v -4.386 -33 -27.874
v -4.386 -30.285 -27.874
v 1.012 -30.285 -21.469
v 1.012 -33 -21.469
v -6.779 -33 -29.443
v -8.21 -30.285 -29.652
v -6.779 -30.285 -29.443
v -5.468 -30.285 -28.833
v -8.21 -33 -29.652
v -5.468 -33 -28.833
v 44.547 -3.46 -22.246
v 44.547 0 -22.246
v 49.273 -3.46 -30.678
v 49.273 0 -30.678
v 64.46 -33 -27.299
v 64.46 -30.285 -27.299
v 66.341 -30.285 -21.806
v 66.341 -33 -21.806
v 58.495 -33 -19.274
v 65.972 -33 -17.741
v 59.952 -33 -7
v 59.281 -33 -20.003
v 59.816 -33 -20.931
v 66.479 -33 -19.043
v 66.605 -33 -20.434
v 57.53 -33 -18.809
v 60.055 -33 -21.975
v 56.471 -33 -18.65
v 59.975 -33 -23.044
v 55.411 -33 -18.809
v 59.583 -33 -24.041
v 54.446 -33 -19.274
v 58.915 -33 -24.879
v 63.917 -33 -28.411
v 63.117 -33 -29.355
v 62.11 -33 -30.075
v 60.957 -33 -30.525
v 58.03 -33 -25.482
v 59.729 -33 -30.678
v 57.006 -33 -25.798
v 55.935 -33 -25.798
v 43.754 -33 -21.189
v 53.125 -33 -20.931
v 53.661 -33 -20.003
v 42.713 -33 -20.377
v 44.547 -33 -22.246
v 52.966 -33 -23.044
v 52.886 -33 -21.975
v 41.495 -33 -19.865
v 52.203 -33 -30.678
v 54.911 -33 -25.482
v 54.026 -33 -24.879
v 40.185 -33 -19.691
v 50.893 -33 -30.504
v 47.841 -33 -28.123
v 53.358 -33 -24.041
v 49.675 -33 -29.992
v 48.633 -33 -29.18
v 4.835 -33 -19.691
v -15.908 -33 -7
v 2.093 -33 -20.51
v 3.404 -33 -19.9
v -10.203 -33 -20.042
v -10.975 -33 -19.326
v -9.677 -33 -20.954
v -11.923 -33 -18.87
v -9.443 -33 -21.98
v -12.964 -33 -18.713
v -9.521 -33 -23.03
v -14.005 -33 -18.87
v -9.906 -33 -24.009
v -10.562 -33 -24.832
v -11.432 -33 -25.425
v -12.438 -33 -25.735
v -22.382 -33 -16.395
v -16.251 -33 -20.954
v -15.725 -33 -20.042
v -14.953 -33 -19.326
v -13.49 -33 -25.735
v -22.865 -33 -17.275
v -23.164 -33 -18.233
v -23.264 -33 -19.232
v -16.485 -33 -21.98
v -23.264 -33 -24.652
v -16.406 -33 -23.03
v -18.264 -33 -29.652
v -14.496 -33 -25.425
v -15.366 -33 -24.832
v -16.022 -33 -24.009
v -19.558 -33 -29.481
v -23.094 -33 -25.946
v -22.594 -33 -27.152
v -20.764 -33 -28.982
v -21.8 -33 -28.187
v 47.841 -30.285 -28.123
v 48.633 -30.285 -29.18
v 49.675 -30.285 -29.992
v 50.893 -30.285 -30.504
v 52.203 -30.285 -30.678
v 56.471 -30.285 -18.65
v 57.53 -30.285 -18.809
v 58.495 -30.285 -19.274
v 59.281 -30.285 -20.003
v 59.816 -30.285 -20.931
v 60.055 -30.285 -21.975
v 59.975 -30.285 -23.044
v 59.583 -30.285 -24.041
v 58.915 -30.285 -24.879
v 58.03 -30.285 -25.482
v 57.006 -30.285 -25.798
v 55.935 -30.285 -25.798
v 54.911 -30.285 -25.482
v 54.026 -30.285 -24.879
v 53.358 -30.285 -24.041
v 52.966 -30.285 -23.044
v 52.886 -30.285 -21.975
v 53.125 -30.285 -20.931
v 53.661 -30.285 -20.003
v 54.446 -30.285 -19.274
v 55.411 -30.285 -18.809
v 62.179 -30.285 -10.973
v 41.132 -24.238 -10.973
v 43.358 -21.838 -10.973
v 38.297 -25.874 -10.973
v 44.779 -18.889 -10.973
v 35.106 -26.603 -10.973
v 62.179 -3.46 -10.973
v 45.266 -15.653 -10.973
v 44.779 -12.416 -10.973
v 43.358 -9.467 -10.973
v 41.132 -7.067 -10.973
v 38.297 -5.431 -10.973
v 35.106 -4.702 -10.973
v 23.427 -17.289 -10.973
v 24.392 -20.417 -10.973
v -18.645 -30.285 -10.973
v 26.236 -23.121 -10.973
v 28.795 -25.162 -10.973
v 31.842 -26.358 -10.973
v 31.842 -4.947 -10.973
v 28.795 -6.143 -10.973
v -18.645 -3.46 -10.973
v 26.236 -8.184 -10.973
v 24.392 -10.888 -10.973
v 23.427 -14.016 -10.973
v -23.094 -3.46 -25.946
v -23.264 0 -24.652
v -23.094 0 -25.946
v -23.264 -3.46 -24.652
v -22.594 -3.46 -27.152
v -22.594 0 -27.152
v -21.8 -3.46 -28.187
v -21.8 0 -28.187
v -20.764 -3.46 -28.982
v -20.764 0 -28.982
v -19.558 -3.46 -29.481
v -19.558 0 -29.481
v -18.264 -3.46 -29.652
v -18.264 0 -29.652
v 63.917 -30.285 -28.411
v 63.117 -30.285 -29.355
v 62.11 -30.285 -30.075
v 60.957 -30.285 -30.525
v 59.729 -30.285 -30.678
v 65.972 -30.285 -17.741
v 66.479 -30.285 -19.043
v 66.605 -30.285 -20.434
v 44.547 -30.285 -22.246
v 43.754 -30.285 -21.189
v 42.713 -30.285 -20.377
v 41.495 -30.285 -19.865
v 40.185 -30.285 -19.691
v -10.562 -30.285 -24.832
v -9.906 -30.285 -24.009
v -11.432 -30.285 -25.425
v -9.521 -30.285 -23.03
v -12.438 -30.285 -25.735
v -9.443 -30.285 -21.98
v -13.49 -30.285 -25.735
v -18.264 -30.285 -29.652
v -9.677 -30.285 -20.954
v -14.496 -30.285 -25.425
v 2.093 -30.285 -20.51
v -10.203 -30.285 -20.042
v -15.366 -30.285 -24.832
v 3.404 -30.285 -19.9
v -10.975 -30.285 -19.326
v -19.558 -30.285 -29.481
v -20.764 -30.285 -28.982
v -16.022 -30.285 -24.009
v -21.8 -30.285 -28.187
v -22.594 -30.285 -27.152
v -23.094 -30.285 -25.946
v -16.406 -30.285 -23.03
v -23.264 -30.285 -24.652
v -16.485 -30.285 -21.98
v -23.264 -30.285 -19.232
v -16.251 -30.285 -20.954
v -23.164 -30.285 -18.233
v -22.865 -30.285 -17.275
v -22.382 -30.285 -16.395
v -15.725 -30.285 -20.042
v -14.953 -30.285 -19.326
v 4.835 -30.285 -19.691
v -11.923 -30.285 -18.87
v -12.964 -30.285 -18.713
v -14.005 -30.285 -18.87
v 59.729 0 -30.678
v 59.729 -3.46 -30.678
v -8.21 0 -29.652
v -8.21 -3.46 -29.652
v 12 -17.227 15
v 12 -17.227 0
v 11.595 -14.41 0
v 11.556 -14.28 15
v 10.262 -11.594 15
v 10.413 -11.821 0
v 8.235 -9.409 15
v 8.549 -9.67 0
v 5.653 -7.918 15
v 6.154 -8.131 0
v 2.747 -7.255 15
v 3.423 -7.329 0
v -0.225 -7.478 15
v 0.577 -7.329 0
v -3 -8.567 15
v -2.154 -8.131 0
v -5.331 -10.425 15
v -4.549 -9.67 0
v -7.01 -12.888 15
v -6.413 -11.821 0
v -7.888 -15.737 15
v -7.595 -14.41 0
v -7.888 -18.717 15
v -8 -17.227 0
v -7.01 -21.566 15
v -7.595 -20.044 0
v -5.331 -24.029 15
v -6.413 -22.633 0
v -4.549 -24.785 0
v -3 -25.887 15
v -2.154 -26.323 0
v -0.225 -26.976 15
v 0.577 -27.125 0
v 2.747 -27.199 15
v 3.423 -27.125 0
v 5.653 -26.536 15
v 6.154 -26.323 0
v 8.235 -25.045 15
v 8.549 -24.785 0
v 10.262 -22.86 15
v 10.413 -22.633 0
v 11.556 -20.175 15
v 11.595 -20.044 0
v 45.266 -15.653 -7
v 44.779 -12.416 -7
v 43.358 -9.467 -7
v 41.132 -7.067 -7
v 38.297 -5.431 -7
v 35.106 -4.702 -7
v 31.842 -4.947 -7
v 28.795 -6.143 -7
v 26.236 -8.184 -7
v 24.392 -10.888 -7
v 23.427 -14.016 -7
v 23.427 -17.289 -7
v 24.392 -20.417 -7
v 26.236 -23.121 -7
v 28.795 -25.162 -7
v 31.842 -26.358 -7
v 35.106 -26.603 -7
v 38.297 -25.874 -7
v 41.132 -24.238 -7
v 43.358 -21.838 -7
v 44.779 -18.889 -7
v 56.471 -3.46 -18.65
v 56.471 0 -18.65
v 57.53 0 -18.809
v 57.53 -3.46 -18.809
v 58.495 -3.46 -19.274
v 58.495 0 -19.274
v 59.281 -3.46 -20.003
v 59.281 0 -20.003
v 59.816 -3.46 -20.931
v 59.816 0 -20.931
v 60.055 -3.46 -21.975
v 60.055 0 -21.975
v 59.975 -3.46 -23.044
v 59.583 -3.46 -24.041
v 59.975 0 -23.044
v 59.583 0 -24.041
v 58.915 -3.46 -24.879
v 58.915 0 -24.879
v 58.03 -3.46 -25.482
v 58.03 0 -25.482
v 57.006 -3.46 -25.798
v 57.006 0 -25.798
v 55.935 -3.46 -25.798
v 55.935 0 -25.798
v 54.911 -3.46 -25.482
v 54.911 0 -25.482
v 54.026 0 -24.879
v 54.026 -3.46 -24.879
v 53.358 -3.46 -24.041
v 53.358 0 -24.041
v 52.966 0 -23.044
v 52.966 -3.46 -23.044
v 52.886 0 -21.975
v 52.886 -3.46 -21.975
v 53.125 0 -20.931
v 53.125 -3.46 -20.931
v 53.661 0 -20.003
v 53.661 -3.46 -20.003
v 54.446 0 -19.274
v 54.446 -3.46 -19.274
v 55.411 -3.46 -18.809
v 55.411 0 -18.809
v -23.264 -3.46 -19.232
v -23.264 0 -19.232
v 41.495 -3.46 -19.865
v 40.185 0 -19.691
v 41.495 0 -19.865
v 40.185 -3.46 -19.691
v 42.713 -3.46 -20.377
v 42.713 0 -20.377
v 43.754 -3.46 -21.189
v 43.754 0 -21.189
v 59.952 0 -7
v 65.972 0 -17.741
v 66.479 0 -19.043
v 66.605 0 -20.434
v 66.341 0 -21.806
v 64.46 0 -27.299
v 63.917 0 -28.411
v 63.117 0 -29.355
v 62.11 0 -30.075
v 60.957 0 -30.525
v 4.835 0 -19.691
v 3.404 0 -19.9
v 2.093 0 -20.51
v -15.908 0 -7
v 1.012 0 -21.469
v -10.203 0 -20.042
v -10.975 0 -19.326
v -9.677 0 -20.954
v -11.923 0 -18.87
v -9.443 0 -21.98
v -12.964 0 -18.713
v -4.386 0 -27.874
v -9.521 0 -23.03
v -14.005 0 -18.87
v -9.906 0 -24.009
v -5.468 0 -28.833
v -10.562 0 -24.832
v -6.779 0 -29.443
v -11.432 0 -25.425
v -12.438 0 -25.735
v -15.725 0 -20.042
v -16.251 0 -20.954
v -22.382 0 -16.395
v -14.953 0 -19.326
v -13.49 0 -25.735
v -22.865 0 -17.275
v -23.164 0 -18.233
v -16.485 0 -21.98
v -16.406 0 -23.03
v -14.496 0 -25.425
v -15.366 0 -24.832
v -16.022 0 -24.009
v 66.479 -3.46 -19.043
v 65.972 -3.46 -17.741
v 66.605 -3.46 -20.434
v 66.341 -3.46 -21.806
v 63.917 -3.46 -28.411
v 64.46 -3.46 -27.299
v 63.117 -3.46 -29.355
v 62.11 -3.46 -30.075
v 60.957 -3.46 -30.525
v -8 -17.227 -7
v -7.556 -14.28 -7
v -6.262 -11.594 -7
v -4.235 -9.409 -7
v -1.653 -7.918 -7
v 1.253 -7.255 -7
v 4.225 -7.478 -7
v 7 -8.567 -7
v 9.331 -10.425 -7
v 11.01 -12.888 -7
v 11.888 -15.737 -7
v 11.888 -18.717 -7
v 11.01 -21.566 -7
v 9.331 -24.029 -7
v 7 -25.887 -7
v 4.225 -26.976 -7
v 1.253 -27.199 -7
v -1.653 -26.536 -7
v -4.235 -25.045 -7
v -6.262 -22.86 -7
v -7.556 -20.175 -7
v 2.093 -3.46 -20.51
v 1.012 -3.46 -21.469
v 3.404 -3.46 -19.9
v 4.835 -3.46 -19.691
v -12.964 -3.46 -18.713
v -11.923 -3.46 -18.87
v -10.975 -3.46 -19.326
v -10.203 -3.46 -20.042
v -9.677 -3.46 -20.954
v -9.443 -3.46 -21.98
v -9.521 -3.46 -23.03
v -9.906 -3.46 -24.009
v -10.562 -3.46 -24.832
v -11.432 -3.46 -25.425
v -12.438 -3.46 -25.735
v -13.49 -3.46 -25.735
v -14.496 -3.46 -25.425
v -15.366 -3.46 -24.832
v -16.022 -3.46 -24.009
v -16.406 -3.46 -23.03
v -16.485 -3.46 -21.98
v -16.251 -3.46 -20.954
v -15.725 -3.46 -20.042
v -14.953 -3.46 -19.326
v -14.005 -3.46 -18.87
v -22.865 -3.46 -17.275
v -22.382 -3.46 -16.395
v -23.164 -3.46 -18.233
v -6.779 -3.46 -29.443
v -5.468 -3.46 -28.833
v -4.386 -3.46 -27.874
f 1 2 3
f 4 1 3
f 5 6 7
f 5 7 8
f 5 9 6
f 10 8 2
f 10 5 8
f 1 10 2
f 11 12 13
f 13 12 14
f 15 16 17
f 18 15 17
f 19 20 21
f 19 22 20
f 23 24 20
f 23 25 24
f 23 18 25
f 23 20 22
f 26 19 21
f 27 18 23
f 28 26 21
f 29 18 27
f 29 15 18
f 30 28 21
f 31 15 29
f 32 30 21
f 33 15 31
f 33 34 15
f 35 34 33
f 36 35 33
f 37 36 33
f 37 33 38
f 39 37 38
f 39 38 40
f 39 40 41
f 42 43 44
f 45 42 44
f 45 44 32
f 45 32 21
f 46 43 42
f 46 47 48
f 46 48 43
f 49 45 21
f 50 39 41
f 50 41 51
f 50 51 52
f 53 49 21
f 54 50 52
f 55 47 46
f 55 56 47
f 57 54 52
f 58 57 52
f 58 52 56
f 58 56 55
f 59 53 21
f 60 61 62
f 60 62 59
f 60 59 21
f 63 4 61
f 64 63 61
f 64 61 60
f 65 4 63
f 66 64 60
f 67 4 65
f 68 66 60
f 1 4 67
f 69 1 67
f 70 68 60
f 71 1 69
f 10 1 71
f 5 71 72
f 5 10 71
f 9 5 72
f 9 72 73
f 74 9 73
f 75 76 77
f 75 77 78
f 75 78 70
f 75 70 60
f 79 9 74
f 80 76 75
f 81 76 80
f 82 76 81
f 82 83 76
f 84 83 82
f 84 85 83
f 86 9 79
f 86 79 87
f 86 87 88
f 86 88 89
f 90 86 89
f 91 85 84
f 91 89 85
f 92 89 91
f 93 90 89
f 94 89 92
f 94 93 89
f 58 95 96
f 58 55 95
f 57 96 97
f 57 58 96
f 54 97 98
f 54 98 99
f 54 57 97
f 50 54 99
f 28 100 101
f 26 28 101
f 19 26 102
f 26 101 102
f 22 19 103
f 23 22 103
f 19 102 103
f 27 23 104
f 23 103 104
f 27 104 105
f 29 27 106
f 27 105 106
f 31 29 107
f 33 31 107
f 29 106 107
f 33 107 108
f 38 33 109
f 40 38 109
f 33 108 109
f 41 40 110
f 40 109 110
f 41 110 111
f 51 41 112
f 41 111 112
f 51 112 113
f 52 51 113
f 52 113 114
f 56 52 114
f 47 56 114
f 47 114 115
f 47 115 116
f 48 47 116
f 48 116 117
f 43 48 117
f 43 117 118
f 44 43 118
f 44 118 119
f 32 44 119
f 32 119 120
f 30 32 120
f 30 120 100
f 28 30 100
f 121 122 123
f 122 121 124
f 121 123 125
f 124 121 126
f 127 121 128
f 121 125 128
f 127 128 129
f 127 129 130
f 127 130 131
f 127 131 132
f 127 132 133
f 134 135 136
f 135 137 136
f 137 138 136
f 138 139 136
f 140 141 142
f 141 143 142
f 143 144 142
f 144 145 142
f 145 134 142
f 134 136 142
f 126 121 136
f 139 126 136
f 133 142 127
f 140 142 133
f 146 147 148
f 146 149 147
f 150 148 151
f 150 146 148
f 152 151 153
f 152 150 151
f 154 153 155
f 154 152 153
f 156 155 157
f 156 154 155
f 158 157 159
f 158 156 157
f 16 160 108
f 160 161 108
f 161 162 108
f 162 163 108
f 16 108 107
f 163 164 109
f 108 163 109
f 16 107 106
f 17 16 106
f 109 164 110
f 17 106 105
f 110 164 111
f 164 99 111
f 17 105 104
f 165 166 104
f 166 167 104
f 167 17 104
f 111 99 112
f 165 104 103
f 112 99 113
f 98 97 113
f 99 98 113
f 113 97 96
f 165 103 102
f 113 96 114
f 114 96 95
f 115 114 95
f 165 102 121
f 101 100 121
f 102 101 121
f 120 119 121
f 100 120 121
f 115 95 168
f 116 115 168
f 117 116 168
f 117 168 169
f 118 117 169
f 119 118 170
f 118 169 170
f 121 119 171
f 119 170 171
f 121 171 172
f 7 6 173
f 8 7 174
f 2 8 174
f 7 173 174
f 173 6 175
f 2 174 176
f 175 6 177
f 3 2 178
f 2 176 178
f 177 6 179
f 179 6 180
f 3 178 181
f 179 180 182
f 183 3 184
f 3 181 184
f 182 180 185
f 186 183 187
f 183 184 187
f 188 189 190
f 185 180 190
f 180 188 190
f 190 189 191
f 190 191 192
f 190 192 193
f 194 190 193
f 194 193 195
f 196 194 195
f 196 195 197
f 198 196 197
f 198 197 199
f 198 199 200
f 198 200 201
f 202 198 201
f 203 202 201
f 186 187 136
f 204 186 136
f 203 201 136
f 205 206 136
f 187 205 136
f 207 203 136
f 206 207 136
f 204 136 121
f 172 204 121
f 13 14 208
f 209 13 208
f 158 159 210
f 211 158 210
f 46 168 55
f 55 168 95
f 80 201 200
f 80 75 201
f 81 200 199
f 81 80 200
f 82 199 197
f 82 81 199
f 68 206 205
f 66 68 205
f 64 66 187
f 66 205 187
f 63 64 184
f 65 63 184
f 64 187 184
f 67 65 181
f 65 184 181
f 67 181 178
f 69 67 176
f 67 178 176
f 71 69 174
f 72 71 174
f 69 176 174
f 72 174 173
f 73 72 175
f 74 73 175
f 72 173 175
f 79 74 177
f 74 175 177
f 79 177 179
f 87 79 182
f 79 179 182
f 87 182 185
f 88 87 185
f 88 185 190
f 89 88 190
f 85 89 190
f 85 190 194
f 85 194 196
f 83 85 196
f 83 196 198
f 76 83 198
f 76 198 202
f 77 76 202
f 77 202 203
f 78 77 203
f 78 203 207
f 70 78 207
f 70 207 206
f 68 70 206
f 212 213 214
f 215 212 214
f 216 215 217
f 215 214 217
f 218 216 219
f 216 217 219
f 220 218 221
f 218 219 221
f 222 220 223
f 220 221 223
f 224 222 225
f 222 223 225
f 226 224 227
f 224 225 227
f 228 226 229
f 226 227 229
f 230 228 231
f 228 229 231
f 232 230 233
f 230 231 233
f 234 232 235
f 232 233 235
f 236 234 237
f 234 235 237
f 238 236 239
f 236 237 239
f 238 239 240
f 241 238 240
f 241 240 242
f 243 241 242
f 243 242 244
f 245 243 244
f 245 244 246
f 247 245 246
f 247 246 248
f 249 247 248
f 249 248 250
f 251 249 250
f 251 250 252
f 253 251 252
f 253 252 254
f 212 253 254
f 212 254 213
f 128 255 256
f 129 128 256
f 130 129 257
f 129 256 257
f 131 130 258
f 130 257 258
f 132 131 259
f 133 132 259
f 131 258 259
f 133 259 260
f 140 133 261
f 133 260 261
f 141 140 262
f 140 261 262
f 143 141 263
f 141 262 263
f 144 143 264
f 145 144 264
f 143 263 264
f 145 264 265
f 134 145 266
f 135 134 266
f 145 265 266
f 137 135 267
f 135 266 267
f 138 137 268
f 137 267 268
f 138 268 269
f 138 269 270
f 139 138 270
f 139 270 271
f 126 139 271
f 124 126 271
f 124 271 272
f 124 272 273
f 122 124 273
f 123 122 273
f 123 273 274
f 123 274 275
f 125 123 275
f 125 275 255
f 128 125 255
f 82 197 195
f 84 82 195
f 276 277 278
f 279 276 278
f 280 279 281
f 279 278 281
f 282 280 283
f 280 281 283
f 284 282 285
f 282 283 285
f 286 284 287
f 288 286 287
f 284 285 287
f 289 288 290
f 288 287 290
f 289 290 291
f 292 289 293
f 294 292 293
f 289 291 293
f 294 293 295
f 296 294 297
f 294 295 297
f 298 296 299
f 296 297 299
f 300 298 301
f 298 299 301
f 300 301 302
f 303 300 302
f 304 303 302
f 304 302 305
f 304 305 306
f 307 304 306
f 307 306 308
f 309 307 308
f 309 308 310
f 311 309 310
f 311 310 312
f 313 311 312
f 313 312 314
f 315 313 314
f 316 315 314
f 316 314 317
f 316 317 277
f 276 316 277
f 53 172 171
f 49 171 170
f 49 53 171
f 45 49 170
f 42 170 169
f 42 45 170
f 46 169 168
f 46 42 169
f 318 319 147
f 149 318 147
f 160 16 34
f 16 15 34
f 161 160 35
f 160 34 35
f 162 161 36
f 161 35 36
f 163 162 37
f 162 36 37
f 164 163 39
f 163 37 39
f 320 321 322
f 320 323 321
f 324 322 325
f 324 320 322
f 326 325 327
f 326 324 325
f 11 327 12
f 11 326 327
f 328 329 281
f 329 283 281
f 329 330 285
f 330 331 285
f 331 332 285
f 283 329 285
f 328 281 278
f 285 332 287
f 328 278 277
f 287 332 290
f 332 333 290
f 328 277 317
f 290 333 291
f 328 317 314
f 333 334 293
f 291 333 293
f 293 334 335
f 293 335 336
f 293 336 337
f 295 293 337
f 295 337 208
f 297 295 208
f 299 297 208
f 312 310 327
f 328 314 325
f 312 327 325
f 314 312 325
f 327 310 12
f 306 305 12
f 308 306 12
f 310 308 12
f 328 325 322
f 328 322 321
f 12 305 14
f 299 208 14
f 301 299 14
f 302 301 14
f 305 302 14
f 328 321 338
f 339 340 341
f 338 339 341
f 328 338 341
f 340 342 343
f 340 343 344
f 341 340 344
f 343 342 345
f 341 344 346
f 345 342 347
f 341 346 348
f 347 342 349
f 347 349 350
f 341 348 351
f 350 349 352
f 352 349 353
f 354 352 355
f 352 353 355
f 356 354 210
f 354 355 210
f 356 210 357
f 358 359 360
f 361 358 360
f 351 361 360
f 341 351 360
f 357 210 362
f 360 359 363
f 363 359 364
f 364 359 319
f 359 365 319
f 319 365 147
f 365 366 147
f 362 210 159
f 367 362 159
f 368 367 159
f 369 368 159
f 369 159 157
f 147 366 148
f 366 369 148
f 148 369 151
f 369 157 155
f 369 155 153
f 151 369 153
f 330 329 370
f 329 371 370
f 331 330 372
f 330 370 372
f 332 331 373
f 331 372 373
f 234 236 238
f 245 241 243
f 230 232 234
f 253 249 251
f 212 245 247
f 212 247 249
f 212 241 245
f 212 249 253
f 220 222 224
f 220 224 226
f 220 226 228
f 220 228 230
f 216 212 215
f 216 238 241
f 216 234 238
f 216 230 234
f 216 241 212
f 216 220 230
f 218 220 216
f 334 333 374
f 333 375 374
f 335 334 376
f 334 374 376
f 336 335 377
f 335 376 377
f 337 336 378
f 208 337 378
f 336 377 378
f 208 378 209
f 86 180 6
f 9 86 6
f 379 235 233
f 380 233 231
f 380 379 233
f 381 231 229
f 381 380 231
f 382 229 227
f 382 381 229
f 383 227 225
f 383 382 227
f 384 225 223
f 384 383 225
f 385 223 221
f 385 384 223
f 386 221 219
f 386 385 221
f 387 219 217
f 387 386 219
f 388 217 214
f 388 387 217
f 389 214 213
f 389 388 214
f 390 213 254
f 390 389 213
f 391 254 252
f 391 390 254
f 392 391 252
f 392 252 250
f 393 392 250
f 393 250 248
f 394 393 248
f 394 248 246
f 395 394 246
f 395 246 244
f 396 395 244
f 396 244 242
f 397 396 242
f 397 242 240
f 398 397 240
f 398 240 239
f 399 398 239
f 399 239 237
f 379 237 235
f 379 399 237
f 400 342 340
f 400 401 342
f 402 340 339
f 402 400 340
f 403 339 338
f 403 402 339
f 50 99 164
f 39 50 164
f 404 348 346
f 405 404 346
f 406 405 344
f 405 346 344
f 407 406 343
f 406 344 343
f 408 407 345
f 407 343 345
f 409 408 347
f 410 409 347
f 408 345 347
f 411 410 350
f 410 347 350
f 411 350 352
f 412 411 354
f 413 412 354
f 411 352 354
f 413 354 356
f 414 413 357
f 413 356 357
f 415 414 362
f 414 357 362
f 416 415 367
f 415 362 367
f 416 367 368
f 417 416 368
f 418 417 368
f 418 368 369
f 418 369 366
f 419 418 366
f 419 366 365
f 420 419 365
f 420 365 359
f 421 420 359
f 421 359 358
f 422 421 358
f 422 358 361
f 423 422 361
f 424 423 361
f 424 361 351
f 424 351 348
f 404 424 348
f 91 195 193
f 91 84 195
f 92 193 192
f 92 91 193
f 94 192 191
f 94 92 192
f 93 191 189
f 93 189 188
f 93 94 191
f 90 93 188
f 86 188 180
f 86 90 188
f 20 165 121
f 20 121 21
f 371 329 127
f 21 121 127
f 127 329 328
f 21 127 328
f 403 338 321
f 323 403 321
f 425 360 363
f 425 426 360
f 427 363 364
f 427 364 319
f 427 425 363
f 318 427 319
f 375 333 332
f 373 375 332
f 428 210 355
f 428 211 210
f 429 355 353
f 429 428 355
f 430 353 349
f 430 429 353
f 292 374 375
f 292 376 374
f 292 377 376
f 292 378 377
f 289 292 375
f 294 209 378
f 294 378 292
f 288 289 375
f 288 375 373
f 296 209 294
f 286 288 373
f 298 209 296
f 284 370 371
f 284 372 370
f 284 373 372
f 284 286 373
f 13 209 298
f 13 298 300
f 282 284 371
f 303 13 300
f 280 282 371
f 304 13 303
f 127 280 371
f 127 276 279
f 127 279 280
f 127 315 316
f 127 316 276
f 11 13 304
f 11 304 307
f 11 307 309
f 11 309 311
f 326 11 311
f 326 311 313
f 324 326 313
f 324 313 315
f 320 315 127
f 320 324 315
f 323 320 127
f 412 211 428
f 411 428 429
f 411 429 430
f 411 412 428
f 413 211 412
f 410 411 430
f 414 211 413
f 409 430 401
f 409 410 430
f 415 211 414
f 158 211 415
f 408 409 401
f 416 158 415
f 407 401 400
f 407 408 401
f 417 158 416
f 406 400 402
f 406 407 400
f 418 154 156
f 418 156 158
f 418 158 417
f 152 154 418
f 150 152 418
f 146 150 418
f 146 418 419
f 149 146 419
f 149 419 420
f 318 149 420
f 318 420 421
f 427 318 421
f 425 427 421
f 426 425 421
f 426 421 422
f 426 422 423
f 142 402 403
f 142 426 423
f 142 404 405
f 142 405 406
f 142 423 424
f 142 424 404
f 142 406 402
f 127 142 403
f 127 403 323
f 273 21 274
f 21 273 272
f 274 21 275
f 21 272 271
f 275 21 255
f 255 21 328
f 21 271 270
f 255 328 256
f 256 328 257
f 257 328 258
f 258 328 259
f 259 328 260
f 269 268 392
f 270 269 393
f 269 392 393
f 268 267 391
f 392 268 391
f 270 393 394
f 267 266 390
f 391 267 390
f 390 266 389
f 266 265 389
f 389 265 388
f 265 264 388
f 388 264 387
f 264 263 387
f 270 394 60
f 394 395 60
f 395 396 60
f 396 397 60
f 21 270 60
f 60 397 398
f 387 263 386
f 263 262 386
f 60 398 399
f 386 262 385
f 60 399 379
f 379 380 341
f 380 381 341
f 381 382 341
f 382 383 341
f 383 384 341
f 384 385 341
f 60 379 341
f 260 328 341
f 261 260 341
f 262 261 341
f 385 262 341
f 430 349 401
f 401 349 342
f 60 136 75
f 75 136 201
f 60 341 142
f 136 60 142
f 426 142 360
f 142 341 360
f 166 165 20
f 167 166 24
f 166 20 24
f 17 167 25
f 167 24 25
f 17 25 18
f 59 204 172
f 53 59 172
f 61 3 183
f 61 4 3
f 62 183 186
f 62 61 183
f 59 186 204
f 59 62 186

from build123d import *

# Parameters (mm, degrees)
SKETCH1_R          = 10
EXTRUDE1_DEPTH     = 15
EXTRUDE2_START     = 7
SKETCH2_R          = 10
EXTRUDE2_DEPTH     = 7
EXTRUDE5_DEPTH     = 33
SKETCH6_W          = 21.871062772
SKETCH6_H          = 26.824754441
CUT_EXTRUDE1_DEPTH = 101.943790616
SKETCH7_R          = 3.531045805
SKETCH7_R_2        = 3.594142414
CUT_EXTRUDE2_DEPTH = 81.795684194
FILLET6_R          = 5
SKETCH8_R          = 10.980976462
CUT_EXTRUDE3_DEPTH = 79.017105375


with BuildPart() as part:
    # Sketch1 → Extrude1 (new body)
    with BuildSketch(Plane.XY):
        with Locations((2, -17.227058485)):
            Circle(SKETCH1_R)
    extrude(amount=EXTRUDE1_DEPTH)

    # Sketch2 → Extrude2 (add)
    with BuildSketch(Plane(origin=(0, 0, 0), x_dir=(-1, 0, 0), z_dir=(0, 0, -1)).offset(EXTRUDE2_START)):
        with Locations((-2, -17.227058485)):
            Circle(SKETCH2_R)
    extrude(amount=-EXTRUDE2_DEPTH)

    # Sketch5 → Extrude5 (add)
    with BuildSketch(Plane(origin=(0, 0, 0), x_dir=(1, 0, 0), z_dir=(0, 1, 0))):
        Polygon((-15.907949581, 7), (-23.26436451, 17.67616864), (-23.26436451, 29.651727827), (-5.884555097, 29.651727827), (2.510054524, 19.69092733), (43.11444927, 19.69092733), (49.273308281, 30.678204329), (63.301820472, 30.678204329), (67.065567645, 19.69092733), (59.951736606, 7), align=None)
    extrude(amount=-EXTRUDE5_DEPTH)

    # Sketch6 → Cut-Extrude1 (cut, through all)
    with BuildSketch(Plane.ZY.offset(23.26436451)):
        with Locations((-21.908176834, -16.872312291)):
            Rectangle(SKETCH6_W, SKETCH6_H)
    extrude(amount=-CUT_EXTRUDE1_DEPTH, mode=Mode.SUBTRACT)

    # Sketch7 → Cut-Extrude2 (cut, through all)
    with BuildSketch(Plane(origin=(0, 0, 0), x_dir=(-1, 0, 0), z_dir=(0, 1, 0))):
        with Locations((12.963937966, -22.243817104)):
            Circle(SKETCH7_R)
        with Locations((-56.470516278, -22.243817104)):
            Circle(SKETCH7_R_2)
    extrude(amount=-CUT_EXTRUDE2_DEPTH, mode=Mode.SUBTRACT)

    # Fillet6
    fillet6_edges = [part.edges().sort_by_distance(p)[0] for p in [
        (67.065567645, -31.642344755, -19.69092733),
        (67.065567645, -1.729967535, -19.69092733),
        (63.301820472, -1.729967535, -30.678204329),
        (63.301820472, -31.642344755, -30.678204329),
        (49.273308281, -31.642344755, -30.678204329),
        (43.11444927, -31.642344755, -19.69092733),
        (43.11444927, -1.729967535, -19.69092733),
        (2.510054524, -31.642344755, -19.69092733),
        (2.510054524, -1.729967535, -19.69092733),
        (-5.884555097, -1.729967535, -29.651727827),
        (-5.884555097, -31.642344755, -29.651727827),
        (-23.26436451, -31.642344755, -17.67616864),
        (-23.26436451, -1.729967535, -17.67616864),
        (-23.26436451, -1.729967535, -29.651727827),
        (-23.26436451, -31.642344755, -29.651727827),
    ]]
    fillet(fillet6_edges, radius=FILLET6_R)

    # Sketch8 → Cut-Extrude3 (cut, through all)
    with BuildSketch(Plane.XY.offset(-7)):
        with Locations((34.285400433, -15.652526202)):
            Circle(SKETCH8_R)
    extrude(amount=-CUT_EXTRUDE3_DEPTH, mode=Mode.SUBTRACT)


solid = part.part
